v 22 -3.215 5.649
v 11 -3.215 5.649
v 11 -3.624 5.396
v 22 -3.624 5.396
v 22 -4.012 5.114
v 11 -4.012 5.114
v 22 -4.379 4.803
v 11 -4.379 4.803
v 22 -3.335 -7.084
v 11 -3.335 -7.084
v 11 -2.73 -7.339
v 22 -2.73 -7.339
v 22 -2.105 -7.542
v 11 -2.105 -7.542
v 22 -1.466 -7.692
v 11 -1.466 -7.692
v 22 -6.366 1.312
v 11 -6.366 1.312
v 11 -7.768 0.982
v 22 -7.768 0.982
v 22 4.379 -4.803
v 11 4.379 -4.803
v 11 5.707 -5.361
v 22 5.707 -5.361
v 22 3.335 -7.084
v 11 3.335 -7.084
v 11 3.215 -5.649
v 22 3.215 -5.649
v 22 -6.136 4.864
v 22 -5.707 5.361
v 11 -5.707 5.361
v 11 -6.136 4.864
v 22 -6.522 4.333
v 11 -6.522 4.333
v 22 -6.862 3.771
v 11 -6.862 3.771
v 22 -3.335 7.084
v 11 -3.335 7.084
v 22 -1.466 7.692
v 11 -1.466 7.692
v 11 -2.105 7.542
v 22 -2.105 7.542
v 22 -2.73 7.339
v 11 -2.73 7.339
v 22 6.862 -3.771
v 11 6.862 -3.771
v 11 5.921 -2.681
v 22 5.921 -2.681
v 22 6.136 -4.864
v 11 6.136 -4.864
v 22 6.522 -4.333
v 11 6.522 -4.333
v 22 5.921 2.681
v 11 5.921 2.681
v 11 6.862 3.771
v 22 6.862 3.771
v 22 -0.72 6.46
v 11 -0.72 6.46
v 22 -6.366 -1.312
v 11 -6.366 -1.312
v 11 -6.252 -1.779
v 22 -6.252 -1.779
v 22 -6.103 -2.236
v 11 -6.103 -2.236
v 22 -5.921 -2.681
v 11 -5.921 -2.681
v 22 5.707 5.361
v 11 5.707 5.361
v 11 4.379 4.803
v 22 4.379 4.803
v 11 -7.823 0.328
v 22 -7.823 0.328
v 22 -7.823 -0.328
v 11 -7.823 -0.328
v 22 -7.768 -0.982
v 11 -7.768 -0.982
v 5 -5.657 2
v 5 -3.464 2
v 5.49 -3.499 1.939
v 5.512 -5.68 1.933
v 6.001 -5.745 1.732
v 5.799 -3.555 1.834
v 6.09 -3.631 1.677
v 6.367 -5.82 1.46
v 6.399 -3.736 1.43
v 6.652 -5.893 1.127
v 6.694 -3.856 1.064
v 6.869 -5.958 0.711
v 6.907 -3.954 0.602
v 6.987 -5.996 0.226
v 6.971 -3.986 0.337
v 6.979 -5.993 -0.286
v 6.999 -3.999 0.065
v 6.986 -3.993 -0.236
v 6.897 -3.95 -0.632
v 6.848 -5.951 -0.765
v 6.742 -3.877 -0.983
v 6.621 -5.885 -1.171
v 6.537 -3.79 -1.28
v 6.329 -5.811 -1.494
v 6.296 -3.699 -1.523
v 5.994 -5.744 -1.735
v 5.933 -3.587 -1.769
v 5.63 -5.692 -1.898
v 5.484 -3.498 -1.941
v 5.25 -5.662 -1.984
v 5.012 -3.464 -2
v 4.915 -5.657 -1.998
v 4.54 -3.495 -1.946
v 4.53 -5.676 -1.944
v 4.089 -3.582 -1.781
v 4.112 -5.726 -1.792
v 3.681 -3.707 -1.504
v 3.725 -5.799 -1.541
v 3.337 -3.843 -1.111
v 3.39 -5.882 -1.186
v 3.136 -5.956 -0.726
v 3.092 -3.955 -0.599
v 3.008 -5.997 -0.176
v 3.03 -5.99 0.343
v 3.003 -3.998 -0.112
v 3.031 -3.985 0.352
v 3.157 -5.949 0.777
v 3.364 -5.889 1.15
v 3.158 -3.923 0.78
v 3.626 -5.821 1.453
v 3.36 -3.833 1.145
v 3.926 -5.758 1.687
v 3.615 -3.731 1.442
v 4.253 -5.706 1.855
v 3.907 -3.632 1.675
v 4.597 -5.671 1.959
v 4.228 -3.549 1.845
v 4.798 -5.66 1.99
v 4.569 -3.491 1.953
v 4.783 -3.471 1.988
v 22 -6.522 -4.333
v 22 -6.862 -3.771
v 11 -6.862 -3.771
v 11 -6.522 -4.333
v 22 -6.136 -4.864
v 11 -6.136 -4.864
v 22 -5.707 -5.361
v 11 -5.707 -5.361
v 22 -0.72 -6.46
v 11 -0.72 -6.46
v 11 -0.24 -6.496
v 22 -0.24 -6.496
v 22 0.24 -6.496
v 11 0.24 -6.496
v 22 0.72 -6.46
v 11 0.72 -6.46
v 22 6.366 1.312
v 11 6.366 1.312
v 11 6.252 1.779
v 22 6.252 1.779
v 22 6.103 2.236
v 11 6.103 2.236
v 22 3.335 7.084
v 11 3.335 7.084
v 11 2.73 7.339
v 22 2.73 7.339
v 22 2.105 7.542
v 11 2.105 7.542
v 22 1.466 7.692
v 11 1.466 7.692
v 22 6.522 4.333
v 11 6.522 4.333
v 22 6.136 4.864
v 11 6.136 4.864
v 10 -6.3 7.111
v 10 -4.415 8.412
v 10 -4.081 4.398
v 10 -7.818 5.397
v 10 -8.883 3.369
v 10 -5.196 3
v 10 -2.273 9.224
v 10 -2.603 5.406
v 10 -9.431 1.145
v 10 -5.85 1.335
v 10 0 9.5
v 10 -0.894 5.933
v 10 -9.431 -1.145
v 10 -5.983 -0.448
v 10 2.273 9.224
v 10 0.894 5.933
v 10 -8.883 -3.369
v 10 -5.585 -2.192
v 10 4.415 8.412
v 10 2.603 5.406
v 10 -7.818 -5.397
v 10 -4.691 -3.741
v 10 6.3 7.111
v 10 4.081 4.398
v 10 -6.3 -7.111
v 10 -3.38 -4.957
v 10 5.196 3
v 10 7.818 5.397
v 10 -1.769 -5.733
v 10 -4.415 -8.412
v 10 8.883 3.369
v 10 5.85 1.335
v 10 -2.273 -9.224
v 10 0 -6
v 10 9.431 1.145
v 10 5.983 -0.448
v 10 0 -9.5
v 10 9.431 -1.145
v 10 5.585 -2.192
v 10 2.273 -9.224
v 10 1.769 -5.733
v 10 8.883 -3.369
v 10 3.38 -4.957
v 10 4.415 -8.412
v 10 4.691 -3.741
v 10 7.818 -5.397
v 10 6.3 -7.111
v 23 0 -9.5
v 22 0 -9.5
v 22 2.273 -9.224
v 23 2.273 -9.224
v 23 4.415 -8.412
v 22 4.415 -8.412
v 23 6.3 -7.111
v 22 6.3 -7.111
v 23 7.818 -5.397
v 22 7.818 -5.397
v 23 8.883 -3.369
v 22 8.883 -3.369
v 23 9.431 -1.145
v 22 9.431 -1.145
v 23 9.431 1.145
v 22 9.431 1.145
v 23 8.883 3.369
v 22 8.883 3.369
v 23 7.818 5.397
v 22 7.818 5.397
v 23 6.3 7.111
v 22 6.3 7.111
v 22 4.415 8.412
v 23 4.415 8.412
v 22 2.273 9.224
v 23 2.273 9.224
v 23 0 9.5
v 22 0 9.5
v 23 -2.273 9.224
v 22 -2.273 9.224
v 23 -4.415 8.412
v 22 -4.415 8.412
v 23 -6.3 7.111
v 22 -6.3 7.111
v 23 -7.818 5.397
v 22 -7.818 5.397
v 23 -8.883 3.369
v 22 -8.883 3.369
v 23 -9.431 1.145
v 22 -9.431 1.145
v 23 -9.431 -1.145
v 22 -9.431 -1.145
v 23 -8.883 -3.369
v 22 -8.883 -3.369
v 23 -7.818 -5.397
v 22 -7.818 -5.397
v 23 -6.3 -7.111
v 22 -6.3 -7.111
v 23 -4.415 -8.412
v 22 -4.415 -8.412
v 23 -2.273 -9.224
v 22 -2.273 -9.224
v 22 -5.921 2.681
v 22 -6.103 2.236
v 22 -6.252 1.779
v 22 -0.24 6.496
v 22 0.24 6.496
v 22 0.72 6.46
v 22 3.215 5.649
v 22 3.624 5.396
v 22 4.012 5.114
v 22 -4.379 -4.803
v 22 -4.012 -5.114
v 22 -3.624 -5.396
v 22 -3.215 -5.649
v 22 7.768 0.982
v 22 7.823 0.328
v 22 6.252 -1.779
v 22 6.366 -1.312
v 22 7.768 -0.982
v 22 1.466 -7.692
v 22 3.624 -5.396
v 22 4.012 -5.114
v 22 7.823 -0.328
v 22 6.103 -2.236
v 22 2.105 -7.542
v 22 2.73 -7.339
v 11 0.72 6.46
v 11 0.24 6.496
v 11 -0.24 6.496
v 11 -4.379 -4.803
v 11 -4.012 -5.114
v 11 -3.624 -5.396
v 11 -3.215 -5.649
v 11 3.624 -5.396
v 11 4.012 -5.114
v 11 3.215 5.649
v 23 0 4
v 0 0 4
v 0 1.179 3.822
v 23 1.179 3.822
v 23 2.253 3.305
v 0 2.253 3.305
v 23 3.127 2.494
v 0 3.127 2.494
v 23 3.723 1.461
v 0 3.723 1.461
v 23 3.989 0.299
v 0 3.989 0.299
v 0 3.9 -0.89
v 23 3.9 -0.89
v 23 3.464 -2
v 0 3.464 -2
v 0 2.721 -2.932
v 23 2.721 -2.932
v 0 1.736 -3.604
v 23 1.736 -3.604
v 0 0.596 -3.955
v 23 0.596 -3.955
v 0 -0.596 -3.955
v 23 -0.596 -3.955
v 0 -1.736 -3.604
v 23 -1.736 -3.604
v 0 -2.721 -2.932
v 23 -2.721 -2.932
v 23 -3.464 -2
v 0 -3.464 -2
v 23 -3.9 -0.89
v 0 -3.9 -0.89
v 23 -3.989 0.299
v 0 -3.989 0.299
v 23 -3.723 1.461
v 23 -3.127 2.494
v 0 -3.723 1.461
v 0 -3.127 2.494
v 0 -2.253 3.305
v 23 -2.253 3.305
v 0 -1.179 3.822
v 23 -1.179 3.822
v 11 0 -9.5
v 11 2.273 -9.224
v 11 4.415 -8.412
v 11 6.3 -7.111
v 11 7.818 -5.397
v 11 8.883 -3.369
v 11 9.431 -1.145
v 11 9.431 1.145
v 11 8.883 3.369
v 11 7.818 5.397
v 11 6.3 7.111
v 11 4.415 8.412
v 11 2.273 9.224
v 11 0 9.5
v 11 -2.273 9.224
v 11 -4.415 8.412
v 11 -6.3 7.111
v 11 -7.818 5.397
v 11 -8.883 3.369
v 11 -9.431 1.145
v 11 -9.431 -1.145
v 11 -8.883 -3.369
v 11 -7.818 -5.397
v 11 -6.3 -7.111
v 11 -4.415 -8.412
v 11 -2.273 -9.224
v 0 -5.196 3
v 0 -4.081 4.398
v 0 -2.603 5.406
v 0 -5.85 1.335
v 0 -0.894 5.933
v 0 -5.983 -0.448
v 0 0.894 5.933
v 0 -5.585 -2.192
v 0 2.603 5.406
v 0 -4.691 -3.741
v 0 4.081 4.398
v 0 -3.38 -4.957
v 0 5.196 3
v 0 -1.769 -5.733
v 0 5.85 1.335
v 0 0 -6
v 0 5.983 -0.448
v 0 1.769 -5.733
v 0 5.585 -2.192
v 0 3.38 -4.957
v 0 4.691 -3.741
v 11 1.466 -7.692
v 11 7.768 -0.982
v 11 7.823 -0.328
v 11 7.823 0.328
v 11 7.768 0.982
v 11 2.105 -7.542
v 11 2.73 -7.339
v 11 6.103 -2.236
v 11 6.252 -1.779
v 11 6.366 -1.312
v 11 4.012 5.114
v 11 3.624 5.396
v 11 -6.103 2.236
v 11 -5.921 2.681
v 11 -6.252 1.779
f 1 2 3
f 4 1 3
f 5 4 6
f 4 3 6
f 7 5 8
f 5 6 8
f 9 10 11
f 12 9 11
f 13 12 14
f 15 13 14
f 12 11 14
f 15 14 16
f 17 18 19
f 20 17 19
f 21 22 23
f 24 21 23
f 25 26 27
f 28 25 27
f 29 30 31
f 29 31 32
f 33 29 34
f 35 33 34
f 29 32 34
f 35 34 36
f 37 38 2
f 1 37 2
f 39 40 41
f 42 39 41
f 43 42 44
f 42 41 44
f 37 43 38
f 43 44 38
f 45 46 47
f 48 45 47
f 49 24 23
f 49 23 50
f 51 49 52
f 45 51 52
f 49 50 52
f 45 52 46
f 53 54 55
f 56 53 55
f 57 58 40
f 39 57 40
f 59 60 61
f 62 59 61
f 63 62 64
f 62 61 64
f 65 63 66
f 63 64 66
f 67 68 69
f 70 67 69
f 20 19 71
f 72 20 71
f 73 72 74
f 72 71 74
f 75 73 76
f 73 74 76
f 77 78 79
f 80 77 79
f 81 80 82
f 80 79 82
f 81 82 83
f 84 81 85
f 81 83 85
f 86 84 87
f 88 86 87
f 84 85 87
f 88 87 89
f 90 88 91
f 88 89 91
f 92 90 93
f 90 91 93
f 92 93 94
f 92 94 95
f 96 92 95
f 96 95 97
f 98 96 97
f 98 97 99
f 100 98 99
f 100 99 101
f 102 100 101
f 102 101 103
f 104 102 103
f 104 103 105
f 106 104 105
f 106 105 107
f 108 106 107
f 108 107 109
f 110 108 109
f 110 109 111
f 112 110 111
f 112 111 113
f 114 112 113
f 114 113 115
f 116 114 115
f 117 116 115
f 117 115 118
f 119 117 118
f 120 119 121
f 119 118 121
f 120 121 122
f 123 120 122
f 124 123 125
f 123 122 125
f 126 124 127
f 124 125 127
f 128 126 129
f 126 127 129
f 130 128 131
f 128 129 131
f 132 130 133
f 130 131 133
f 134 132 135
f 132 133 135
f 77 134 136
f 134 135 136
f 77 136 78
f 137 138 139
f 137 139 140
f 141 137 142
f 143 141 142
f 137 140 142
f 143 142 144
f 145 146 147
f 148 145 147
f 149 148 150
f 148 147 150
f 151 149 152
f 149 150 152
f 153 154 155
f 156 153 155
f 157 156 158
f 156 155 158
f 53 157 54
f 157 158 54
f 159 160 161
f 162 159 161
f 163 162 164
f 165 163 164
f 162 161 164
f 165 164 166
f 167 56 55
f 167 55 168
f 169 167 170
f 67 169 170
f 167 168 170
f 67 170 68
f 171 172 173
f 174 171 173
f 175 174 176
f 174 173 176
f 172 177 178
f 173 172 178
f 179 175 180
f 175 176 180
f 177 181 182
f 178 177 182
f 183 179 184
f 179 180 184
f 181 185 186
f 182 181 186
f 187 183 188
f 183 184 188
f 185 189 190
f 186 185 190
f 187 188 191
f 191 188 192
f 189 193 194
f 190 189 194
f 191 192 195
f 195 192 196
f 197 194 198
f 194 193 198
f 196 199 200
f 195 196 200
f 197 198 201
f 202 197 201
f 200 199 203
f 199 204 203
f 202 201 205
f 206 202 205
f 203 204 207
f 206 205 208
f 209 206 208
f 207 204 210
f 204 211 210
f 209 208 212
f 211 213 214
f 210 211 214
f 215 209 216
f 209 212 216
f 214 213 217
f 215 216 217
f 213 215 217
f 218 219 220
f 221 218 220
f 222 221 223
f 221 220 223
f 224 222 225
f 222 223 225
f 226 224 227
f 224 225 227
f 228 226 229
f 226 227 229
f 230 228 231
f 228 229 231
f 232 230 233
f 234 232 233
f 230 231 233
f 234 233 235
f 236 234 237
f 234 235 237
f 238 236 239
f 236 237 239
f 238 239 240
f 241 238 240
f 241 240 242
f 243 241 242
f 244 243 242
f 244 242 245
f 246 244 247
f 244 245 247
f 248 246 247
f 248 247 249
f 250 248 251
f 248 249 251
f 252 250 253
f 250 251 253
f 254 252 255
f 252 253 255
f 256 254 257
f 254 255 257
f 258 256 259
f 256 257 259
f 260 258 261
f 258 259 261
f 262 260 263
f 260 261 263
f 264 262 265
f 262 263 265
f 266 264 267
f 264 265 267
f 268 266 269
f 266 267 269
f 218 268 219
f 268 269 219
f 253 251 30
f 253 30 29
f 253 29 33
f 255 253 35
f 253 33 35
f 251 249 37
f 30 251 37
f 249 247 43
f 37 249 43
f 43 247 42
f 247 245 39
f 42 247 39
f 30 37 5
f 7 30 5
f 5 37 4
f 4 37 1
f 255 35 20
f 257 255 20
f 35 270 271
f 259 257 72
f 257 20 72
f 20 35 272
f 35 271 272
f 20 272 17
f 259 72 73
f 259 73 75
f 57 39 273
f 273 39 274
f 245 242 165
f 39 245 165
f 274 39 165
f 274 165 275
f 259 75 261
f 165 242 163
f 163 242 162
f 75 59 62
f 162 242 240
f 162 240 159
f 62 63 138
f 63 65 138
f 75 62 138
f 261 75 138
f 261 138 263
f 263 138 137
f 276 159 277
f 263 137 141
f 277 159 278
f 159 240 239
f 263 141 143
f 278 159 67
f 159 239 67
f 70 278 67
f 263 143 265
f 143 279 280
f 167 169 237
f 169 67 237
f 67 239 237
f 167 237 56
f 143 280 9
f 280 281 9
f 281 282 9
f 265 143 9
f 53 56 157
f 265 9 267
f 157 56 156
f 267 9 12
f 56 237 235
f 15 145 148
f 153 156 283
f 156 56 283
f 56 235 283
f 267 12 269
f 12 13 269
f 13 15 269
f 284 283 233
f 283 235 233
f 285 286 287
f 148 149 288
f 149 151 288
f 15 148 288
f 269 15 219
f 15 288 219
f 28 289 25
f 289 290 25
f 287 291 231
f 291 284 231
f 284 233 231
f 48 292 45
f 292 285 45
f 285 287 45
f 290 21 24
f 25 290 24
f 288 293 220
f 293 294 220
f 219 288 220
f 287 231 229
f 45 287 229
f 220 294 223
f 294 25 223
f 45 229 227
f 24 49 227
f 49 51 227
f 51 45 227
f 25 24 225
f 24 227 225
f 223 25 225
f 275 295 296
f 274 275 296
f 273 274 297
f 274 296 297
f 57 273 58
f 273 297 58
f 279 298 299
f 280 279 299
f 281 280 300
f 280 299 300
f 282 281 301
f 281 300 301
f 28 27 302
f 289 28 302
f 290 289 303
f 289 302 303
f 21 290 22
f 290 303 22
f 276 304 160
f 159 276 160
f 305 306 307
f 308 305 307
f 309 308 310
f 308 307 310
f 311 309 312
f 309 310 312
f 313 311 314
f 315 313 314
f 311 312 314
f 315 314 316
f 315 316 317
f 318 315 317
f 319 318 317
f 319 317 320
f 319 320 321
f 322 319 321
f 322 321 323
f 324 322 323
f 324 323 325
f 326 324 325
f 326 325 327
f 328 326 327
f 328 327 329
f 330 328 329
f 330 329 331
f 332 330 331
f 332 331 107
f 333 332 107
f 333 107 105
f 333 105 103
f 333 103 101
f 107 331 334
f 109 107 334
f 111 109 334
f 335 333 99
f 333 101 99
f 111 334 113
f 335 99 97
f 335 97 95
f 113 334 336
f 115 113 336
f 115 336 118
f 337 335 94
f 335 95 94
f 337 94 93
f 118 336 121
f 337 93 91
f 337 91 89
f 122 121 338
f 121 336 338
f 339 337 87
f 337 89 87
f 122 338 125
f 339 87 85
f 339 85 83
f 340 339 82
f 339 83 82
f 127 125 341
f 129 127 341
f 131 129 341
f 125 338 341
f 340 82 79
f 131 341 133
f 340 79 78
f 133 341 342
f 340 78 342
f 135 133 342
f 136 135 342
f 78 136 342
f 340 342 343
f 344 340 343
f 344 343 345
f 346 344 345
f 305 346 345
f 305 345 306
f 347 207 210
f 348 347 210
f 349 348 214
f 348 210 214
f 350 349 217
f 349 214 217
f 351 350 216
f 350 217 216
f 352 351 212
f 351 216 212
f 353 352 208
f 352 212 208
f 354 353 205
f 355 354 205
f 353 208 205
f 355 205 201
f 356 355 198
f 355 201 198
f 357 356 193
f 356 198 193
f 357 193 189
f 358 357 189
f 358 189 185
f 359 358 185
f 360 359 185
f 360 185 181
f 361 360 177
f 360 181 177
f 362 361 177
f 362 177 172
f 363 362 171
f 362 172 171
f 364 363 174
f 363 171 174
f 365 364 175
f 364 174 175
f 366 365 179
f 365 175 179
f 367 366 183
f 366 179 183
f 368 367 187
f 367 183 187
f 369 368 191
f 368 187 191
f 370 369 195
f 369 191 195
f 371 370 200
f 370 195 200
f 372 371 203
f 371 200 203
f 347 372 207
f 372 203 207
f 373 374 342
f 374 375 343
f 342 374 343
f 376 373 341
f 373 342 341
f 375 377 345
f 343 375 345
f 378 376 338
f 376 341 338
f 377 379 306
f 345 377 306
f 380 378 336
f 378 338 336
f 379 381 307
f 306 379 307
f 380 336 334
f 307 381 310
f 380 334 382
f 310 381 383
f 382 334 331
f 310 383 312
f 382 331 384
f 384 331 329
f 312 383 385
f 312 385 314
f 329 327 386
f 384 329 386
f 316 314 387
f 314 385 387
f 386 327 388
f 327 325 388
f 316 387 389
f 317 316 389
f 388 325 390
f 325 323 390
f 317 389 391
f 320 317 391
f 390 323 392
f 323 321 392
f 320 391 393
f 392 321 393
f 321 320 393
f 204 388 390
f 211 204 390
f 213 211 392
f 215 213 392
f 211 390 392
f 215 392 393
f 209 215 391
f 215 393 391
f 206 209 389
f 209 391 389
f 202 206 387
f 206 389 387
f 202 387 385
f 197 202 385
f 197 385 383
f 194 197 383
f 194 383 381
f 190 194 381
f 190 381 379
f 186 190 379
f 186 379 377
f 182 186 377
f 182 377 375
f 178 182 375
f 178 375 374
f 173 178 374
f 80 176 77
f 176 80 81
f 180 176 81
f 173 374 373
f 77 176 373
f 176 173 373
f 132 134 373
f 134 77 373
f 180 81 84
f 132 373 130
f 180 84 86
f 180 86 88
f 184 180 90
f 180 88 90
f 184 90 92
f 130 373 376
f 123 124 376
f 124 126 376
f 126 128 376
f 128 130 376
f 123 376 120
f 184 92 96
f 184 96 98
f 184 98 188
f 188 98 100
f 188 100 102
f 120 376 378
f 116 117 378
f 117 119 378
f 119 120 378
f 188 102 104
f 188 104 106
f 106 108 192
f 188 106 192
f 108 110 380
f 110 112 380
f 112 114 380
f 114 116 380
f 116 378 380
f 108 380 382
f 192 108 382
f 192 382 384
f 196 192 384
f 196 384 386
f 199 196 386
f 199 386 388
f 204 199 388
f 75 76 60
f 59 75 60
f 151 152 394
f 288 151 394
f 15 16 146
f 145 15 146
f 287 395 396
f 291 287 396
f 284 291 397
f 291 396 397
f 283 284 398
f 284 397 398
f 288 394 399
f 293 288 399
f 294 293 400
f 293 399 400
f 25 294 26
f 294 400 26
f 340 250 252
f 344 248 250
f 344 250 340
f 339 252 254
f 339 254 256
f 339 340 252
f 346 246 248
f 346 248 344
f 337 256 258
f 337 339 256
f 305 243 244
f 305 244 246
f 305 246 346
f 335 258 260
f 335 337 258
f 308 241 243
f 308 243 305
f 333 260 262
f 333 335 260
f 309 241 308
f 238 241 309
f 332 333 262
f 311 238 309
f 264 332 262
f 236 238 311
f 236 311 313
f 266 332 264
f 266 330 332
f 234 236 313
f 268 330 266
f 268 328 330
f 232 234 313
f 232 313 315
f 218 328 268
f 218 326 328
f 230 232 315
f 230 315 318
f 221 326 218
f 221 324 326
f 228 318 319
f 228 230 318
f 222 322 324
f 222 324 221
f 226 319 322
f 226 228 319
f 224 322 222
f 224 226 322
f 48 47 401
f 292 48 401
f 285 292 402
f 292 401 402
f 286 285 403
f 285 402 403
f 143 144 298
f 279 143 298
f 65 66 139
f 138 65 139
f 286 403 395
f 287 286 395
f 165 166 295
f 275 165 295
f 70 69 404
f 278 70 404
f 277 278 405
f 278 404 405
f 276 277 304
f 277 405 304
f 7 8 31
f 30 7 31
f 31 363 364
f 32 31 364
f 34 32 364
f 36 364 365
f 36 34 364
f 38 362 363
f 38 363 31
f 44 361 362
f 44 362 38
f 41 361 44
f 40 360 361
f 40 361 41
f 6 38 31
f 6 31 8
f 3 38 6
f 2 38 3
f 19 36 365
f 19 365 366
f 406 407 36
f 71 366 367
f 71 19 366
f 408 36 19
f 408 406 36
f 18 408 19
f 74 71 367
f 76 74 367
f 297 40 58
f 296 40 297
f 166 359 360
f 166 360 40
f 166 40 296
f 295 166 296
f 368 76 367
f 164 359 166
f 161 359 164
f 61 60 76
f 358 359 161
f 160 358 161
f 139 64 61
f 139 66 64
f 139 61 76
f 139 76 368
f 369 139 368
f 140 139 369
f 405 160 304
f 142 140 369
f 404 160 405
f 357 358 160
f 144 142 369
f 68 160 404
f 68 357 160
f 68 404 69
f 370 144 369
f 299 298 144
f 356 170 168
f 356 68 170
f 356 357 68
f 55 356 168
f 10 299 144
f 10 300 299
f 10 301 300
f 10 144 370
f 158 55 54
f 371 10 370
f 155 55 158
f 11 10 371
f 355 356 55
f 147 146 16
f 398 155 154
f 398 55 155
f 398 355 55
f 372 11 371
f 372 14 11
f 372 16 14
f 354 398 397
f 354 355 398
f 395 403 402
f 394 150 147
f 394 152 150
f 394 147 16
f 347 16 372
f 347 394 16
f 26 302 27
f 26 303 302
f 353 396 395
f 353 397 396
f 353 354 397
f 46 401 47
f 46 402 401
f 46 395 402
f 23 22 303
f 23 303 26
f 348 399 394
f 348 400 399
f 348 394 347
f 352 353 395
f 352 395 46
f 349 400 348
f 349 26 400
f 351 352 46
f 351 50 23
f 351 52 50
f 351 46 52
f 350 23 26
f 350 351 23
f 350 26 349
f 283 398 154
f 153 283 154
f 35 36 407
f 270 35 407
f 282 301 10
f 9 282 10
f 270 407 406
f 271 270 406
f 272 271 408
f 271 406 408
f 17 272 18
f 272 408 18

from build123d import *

# Parameters (mm, degrees)
SKETCH1_R           = 6
BOSS_EXTRUDE1_DEPTH = 10
SKETCH2_R           = 9.5
BOSS_EXTRUDE2_DEPTH = 1
BOSS_EXTRUDE3_DEPTH = 11
SKETCH4_R           = 9.5
BOSS_EXTRUDE4_DEPTH = 1
SKETCH5_R           = 4
CUT_EXTRUDE1_DEPTH  = 27.636441204
SKETCH6_R           = 2
CUT_EXTRUDE2_DEPTH  = 27.636441204


with BuildPart() as part:
    # Sketch1 → Boss-Extrude1 (new body)
    with BuildSketch(Plane(origin=(0, 0, 0), x_dir=(0, 0, -1), z_dir=(1, 0, 0))):
        Circle(SKETCH1_R)
    extrude(amount=BOSS_EXTRUDE1_DEPTH)

    # Sketch2 → Boss-Extrude2 (add)
    with BuildSketch(Plane(origin=(10, 0, 0), x_dir=(0, 0, -1), z_dir=(1, 0, 0))):
        Circle(SKETCH2_R)
    extrude(amount=BOSS_EXTRUDE2_DEPTH)

    # Sketch3 → Boss-Extrude3 (add)
    with BuildSketch(Plane(origin=(11, 0, 0), x_dir=(0, 0, -1), z_dir=(1, 0, 0))):
        with BuildLine():
            Line((-0.982460567, 7.768118899), (-1.311725835, 6.366268557))
            ThreePointArc((-1.311725835, 6.366268557), (-2.008610463, 6.181867356), (-2.680790278, 5.921432554))
            Line((-2.680790278, 5.921432554), (-3.771158432, 6.862016036))
            ThreePointArc((-3.771158432, 6.862016036), (-4.602358525, 6.334603066), (-5.360813022, 5.707064372))
            Line((-5.360813022, 5.707064372), (-4.803207262, 4.379406352))
            ThreePointArc((-4.803207262, 4.379406352), (-5.258610463, 3.82060414), (-5.64933562, 3.214810577))
            Line((-5.64933562, 3.214810577), (-7.084323087, 3.334856278))
            ThreePointArc((-7.084323087, 3.334856278), (-7.446772523, 2.419603066), (-7.69151711, 1.46610523))
            Line((-7.69151711, 1.46610523), (-6.46002677, 0.719759772))
            ThreePointArc((-6.46002677, 0.719759772), (-6.5, 0), (-6.46002677, -0.719759772))
            Line((-6.46002677, -0.719759772), (-7.69151711, -1.46610523))
            ThreePointArc((-7.69151711, -1.46610523), (-7.446772523, -2.419603066), (-7.084323087, -3.334856278))
            Line((-7.084323087, -3.334856278), (-5.64933562, -3.214810577))
            ThreePointArc((-5.64933562, -3.214810577), (-5.258610463, -3.82060414), (-4.803207262, -4.379406352))
            Line((-4.803207262, -4.379406352), (-5.360813022, -5.707064372))
            ThreePointArc((-5.360813022, -5.707064372), (-4.602358525, -6.334603066), (-3.771158432, -6.862016036))
            Line((-3.771158432, -6.862016036), (-2.680790278, -5.921432554))
            ThreePointArc((-2.680790278, -5.921432554), (-2.008610463, -6.181867356), (-1.311725835, -6.366268557))
            Line((-1.311725835, -6.366268557), (-0.982460567, -7.768118899))
            ThreePointArc((-0.982460567, -7.768118899), (0, -7.83), (0.982460567, -7.768118899))
            Line((0.982460567, -7.768118899), (1.311725835, -6.366268557))
            ThreePointArc((1.311725835, -6.366268557), (2.008610463, -6.181867356), (2.680790278, -5.921432554))
            Line((2.680790278, -5.921432554), (3.771158432, -6.862016036))
            ThreePointArc((3.771158432, -6.862016036), (4.602358525, -6.334603066), (5.360813022, -5.707064372))
            Line((5.360813022, -5.707064372), (4.803207262, -4.379406352))
            ThreePointArc((4.803207262, -4.379406352), (5.258610463, -3.82060414), (5.64933562, -3.214810577))
            Line((5.64933562, -3.214810577), (7.084323087, -3.334856278))
            ThreePointArc((7.084323087, -3.334856278), (7.446772523, -2.419603066), (7.69151711, -1.46610523))
            Line((7.69151711, -1.46610523), (6.46002677, -0.719759772))
            ThreePointArc((6.46002677, -0.719759772), (6.5, 0), (6.46002677, 0.719759772))
            Line((6.46002677, 0.719759772), (7.69151711, 1.46610523))
            ThreePointArc((7.69151711, 1.46610523), (7.446772523, 2.419603066), (7.084323087, 3.334856278))
            Line((7.084323087, 3.334856278), (5.64933562, 3.214810577))
            ThreePointArc((5.64933562, 3.214810577), (5.258610463, 3.82060414), (4.803207262, 4.379406352))
            Line((4.803207262, 4.379406352), (5.360813022, 5.707064372))
            ThreePointArc((5.360813022, 5.707064372), (4.602358525, 6.334603066), (3.771158432, 6.862016036))
            Line((3.771158432, 6.862016036), (2.680790278, 5.921432554))
            ThreePointArc((2.680790278, 5.921432554), (2.008610463, 6.181867356), (1.311725835, 6.366268557))
            Line((1.311725835, 6.366268557), (0.982460567, 7.768118899))
            ThreePointArc((0.982460567, 7.768118899), (0, 7.83), (-0.982460567, 7.768118899))
        make_face()
    extrude(amount=BOSS_EXTRUDE3_DEPTH)

    # Sketch4 → Boss-Extrude4 (add)
    with BuildSketch(Plane(origin=(22, 0, 0), x_dir=(0, 0, -1), z_dir=(1, 0, 0))):
        Circle(SKETCH4_R)
    extrude(amount=BOSS_EXTRUDE4_DEPTH)

    # Sketch5 → Cut-Extrude1 (cut, through all)
    with BuildSketch(Plane.ZY):
        Circle(SKETCH5_R)
    extrude(amount=-CUT_EXTRUDE1_DEPTH, mode=Mode.SUBTRACT)

    # Sketch6 → Cut-Extrude2 (cut, through all)
    with BuildSketch(Plane(origin=(0, 0, 0), x_dir=(1, 0, 0), z_dir=(0, 1, 0))):
        with Locations(Location((5, 0, 0), (0, 0, 270))):
            Circle(SKETCH6_R)
    extrude(amount=-CUT_EXTRUDE2_DEPTH, mode=Mode.SUBTRACT)


solid = part.part
